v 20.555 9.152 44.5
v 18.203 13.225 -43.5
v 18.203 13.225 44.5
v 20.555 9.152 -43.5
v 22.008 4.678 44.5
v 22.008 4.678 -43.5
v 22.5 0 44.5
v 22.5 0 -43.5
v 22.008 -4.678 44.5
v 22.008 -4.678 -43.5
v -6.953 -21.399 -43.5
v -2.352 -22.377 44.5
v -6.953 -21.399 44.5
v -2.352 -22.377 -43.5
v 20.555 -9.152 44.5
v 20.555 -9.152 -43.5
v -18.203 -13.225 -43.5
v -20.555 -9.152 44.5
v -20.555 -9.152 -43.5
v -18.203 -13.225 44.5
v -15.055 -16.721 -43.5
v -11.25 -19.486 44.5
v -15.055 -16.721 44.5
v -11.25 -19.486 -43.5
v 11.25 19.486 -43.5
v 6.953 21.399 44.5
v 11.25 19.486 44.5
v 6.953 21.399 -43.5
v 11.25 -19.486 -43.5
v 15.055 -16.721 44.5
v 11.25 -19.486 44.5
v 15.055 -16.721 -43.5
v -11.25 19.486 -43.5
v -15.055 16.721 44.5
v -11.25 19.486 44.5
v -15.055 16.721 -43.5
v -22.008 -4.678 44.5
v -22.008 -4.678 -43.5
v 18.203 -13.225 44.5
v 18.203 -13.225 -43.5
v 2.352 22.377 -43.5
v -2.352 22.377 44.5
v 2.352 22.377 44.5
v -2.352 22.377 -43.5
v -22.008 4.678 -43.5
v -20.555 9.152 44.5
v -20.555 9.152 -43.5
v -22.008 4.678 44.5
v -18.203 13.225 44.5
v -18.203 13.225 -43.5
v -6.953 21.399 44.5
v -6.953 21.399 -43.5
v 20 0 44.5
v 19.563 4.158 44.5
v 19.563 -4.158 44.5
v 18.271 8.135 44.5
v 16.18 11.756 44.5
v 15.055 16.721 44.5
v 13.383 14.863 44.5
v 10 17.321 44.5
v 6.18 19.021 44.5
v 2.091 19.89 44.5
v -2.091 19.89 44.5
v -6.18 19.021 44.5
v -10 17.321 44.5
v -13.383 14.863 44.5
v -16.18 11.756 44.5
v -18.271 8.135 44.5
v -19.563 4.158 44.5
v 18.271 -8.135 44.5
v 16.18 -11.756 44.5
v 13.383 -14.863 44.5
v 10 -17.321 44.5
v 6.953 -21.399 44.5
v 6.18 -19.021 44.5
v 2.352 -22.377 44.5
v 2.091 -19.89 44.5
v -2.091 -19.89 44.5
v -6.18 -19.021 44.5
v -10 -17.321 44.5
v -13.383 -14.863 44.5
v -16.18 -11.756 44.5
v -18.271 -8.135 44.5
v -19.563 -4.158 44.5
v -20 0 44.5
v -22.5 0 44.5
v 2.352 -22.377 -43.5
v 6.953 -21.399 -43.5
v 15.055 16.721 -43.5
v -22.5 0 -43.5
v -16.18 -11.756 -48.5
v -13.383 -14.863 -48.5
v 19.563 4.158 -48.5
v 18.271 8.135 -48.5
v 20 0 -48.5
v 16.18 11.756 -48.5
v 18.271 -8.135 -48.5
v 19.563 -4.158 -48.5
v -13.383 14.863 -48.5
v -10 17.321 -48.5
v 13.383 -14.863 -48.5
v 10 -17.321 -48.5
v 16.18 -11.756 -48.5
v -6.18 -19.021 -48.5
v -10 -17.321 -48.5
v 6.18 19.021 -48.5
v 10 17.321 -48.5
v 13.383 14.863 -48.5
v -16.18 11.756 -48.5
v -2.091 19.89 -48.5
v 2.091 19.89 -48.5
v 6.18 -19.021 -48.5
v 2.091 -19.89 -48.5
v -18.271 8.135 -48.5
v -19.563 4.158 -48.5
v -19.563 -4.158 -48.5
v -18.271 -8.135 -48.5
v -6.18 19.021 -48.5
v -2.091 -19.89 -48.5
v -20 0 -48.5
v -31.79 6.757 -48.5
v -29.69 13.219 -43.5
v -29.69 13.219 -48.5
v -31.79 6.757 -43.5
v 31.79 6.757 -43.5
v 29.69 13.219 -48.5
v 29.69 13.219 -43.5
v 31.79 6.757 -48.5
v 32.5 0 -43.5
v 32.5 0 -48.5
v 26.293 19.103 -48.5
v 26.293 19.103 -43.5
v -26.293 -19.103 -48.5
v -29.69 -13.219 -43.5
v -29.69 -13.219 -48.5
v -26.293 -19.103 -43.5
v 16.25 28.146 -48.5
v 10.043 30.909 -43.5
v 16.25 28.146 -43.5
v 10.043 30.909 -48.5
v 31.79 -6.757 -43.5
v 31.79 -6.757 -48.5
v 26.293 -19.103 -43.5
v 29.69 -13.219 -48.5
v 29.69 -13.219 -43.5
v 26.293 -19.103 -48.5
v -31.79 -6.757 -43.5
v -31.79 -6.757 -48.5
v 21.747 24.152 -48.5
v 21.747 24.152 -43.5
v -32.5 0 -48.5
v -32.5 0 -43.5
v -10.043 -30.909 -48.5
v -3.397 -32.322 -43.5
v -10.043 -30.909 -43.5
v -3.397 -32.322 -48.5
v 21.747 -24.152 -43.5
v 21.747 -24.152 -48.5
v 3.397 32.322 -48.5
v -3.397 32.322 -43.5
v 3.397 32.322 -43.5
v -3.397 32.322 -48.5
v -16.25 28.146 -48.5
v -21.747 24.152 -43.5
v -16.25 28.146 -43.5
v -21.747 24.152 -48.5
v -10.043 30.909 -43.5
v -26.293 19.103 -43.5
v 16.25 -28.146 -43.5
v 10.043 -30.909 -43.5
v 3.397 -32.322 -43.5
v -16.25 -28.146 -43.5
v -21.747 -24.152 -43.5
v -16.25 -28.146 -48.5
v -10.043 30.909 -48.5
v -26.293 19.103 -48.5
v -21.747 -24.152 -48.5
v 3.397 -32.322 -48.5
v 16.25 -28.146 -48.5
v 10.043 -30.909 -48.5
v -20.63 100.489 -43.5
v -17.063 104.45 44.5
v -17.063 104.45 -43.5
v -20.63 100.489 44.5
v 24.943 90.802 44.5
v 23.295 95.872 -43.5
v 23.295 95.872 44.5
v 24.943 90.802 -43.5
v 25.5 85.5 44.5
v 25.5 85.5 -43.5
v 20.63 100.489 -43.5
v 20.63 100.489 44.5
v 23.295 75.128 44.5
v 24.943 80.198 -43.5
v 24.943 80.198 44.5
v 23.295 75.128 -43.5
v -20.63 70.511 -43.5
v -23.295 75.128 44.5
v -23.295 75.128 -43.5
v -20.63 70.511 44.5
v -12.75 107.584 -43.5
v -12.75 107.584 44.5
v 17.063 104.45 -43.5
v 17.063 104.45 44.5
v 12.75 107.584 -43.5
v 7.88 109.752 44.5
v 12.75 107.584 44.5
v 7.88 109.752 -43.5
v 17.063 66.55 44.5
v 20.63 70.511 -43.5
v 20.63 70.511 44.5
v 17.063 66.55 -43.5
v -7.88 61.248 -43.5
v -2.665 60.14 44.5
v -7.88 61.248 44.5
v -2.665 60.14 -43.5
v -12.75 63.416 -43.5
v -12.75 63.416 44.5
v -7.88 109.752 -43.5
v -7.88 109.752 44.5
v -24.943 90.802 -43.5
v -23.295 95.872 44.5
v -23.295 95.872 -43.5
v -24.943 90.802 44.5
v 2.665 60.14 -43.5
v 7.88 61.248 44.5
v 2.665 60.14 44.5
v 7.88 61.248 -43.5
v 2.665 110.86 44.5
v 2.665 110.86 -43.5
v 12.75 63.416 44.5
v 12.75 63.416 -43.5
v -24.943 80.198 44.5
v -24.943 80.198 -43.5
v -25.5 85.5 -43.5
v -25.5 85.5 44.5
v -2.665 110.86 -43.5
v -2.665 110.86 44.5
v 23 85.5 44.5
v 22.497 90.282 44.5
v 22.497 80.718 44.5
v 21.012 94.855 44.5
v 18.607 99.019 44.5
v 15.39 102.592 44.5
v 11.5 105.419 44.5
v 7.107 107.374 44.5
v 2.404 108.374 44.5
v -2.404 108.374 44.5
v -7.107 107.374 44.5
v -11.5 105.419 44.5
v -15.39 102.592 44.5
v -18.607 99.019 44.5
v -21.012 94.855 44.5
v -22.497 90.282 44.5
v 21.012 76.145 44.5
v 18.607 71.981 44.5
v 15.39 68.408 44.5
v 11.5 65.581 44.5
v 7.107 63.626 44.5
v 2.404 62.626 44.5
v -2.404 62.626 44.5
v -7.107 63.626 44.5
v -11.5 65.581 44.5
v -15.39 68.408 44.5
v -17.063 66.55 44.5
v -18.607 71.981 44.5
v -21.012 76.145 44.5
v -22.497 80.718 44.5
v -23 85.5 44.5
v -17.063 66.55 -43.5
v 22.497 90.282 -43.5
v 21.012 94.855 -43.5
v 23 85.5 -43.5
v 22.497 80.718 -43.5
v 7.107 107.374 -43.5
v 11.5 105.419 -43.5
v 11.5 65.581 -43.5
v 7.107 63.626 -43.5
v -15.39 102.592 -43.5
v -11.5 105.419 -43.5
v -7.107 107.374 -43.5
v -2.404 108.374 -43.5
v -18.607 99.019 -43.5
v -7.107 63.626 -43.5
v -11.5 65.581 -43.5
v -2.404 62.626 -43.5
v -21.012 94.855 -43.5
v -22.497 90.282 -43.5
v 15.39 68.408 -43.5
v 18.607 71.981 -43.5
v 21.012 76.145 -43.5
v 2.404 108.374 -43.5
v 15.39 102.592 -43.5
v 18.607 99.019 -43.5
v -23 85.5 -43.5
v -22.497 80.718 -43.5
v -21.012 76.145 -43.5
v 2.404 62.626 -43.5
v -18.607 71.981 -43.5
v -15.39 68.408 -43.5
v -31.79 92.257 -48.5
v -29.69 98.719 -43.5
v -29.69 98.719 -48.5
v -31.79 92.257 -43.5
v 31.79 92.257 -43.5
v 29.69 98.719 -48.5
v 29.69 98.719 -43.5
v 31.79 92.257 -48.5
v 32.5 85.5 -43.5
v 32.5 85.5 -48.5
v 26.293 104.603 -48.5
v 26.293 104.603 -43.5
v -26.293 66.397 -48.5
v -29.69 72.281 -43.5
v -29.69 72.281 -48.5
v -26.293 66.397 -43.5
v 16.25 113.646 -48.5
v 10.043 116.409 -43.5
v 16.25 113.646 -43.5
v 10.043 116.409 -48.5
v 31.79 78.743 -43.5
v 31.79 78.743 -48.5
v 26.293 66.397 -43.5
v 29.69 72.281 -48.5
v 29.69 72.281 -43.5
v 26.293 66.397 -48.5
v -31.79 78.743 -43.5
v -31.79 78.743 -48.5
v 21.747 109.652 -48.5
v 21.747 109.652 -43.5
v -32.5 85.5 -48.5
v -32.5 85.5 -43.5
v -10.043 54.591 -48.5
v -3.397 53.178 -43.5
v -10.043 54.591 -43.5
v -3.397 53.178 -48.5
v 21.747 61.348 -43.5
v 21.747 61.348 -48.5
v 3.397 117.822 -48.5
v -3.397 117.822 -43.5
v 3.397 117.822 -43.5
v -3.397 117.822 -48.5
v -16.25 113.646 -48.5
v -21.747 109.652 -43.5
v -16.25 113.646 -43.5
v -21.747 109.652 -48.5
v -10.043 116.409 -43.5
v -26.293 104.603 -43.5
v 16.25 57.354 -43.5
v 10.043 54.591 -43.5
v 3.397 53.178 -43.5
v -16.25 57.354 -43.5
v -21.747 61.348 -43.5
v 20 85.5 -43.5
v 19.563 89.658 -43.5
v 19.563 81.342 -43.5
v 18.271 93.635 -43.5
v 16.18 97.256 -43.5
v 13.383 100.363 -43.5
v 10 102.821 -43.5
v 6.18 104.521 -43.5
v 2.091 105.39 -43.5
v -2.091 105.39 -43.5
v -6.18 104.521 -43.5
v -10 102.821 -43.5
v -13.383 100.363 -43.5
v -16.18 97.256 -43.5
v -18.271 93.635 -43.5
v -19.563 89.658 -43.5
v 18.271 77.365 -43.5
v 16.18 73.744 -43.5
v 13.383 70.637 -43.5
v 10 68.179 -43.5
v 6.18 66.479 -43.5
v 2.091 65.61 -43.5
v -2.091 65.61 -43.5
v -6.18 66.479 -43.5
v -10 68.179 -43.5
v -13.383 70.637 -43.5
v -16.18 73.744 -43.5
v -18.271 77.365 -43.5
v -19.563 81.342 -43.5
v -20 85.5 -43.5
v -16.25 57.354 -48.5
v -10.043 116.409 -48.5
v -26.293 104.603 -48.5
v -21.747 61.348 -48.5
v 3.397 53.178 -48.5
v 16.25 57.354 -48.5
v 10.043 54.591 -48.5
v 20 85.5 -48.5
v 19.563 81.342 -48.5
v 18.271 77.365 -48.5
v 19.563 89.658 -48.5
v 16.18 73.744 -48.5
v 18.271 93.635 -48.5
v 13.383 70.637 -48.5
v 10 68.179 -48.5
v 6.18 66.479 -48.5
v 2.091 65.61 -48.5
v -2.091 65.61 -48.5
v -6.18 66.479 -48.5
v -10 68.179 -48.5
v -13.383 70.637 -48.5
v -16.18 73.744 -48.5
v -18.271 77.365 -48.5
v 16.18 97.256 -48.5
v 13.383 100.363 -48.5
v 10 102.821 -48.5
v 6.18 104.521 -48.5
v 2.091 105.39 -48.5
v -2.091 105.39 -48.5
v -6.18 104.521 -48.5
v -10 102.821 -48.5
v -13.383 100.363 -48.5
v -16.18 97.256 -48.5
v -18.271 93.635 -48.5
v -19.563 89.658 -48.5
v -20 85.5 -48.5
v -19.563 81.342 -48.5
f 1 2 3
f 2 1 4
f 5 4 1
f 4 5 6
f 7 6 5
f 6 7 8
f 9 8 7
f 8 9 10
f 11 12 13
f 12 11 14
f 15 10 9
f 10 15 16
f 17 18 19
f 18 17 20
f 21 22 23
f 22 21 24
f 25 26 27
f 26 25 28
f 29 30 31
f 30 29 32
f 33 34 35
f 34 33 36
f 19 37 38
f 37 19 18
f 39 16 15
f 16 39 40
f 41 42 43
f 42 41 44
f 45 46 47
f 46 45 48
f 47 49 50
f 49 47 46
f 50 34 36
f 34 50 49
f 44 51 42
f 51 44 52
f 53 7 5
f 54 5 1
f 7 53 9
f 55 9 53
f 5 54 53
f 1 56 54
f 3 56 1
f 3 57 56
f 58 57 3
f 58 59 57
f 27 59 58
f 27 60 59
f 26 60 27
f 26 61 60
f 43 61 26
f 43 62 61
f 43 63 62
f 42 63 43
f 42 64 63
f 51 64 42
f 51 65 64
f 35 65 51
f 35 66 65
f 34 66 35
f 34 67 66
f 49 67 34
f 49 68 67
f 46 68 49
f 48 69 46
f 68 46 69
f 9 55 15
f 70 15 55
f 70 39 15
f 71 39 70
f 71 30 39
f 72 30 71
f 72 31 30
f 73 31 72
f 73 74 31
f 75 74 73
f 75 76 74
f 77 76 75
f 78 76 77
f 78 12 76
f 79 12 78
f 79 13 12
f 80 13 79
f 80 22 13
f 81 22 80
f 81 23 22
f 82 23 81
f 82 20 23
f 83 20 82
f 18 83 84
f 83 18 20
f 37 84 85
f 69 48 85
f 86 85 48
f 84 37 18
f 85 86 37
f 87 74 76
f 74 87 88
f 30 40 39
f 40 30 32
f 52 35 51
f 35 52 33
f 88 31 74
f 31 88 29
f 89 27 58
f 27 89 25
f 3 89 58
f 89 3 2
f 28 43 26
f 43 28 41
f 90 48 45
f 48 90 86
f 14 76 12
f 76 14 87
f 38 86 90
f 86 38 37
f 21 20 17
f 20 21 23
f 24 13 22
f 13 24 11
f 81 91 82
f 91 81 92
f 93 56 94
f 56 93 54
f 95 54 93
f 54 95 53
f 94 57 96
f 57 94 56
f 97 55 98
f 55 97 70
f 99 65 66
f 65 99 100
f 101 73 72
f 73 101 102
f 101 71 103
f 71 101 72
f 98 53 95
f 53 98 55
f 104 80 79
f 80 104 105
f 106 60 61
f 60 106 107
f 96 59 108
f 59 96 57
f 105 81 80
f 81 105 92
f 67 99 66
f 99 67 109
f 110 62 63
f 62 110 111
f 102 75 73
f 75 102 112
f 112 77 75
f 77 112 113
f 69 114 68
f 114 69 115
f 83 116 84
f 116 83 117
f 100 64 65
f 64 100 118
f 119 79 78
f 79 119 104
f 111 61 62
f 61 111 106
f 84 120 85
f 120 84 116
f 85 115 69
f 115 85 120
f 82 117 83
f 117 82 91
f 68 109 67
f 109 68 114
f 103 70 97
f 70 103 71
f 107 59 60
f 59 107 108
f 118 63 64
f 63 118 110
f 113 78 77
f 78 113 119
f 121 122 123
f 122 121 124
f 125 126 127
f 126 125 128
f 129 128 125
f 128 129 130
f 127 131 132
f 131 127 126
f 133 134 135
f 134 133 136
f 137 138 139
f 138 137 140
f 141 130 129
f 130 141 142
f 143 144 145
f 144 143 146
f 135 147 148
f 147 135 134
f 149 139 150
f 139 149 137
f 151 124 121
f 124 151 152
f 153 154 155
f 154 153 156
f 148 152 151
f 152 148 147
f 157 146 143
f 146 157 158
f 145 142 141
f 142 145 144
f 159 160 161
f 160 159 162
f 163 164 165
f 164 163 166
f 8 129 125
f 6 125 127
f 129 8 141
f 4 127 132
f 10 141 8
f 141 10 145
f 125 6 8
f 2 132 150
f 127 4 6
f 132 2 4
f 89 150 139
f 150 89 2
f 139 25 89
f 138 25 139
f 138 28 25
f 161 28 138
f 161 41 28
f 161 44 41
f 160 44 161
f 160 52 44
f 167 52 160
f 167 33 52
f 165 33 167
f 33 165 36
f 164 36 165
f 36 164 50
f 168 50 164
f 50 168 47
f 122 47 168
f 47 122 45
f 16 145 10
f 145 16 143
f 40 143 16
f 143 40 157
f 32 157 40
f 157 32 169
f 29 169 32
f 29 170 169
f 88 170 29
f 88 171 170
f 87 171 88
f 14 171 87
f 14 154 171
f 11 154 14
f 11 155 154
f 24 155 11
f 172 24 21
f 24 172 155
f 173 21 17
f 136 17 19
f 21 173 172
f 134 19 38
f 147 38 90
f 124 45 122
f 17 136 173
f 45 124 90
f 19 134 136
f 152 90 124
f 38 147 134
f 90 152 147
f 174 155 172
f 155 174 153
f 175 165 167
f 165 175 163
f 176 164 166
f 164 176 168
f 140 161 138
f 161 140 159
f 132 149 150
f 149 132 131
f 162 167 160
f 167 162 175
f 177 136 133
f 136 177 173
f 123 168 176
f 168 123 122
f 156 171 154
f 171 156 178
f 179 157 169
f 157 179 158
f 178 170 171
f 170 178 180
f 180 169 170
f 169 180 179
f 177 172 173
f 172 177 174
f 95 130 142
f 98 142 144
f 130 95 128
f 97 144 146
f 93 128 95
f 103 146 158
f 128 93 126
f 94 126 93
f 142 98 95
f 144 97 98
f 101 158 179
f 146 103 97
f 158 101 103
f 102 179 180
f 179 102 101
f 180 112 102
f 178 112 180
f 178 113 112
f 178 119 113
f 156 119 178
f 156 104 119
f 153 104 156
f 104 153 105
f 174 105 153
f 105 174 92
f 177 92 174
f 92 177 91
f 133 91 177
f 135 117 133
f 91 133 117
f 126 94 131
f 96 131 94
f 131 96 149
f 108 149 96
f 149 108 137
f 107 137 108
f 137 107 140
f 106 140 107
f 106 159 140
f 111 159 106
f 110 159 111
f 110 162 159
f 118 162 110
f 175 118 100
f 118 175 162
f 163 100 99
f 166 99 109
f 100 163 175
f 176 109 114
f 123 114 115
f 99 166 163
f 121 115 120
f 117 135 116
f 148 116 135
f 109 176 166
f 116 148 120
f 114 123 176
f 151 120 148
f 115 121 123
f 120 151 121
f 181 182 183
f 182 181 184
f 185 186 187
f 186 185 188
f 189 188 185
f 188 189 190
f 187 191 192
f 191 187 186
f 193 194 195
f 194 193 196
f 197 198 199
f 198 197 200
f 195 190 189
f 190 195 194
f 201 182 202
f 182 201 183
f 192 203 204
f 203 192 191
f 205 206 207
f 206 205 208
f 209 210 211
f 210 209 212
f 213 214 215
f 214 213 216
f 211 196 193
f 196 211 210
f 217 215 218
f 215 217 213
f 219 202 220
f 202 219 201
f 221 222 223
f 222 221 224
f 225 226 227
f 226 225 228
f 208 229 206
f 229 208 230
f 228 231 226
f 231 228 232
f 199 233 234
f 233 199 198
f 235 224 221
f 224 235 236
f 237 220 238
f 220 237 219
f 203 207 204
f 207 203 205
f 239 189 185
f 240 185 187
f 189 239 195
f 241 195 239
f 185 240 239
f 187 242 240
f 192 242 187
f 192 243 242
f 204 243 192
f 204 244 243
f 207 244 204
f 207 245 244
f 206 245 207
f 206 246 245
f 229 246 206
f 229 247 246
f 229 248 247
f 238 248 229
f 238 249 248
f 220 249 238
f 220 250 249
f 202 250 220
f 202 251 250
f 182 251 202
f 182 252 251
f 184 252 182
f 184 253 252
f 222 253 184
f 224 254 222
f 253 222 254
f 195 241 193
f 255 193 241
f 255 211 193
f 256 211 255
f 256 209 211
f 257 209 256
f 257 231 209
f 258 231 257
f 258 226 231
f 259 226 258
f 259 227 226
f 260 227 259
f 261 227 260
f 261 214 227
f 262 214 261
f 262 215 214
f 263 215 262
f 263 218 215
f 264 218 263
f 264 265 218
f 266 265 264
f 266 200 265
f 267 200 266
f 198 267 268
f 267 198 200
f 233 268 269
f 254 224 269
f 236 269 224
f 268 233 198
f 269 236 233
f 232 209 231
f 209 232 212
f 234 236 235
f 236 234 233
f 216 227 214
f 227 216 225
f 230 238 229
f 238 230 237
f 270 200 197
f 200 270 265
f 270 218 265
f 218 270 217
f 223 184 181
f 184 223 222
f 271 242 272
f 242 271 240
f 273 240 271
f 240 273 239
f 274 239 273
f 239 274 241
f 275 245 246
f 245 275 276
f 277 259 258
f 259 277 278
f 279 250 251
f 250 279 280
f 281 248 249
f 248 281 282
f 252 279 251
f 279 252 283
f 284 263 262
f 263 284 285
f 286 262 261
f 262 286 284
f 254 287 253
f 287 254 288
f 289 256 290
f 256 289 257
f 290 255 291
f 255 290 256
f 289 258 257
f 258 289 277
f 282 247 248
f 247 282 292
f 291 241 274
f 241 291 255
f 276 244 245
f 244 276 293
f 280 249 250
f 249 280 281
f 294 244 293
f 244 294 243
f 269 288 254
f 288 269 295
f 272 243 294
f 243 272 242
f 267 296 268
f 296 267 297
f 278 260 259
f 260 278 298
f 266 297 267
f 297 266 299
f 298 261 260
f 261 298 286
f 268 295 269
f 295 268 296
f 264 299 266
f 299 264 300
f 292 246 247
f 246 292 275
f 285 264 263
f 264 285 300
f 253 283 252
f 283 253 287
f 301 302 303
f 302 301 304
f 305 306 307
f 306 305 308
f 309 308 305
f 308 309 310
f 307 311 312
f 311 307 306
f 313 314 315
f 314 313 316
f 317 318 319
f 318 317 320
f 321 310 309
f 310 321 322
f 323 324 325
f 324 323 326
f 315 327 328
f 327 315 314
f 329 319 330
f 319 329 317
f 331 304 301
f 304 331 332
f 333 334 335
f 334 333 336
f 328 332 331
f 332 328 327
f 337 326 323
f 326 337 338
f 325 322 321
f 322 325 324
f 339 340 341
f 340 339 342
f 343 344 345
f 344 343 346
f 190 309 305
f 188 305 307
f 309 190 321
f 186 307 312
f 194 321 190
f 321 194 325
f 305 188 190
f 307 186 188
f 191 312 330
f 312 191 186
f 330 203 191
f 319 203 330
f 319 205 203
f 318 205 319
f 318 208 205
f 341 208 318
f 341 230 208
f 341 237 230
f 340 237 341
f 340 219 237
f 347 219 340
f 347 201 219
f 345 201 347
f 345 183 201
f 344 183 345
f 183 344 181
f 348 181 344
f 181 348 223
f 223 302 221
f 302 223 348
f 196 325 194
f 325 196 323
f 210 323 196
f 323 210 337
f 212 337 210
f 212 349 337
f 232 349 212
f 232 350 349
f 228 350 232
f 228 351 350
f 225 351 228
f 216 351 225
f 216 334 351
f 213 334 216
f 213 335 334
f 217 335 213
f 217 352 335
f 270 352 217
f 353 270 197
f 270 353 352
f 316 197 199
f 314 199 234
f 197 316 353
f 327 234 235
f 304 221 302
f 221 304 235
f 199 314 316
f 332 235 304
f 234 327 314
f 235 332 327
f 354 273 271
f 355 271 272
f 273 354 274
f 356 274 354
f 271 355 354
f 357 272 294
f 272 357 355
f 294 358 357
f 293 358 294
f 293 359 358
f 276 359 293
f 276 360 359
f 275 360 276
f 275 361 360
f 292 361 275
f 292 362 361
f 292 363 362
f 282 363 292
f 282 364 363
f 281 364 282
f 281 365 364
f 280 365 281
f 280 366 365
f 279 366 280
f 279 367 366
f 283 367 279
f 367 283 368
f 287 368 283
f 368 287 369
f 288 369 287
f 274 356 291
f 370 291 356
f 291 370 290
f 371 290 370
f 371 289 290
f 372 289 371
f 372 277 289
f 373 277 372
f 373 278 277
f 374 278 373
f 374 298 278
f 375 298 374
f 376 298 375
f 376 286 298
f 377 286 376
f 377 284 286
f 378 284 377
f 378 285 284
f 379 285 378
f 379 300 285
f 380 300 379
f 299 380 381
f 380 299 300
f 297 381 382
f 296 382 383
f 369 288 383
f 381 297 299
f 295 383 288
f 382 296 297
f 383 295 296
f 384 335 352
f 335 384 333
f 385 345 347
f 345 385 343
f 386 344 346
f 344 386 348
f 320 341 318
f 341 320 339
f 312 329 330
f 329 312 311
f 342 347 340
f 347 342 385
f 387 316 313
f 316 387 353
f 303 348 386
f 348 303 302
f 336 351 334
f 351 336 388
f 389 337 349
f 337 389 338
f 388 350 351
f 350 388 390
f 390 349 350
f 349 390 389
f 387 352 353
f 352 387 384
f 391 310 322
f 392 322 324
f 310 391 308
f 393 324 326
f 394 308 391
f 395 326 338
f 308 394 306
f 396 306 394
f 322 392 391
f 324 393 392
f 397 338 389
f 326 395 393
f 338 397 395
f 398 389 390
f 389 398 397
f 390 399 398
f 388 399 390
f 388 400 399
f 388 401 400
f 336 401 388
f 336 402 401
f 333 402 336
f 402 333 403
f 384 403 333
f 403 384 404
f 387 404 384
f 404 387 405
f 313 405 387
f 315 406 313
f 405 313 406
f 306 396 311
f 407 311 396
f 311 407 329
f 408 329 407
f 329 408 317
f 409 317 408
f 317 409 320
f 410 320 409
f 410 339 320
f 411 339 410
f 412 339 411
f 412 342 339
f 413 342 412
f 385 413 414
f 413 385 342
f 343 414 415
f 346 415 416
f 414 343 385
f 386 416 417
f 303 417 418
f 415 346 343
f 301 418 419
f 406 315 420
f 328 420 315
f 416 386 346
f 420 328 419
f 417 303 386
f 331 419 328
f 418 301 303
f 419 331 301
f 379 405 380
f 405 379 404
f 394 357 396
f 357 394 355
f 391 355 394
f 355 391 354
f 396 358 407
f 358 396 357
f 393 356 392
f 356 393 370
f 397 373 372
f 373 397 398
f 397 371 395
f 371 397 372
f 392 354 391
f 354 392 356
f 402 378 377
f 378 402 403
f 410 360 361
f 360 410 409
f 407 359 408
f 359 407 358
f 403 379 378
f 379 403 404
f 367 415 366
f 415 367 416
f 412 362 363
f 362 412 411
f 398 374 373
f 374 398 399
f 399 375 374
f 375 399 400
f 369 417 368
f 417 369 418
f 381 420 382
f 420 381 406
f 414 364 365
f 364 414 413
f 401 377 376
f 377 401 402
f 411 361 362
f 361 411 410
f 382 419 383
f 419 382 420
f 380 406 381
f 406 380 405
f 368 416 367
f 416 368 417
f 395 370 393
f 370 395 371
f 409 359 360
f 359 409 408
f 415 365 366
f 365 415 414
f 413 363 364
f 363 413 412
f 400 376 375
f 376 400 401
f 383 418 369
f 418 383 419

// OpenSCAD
passthrough_height = 89;
passthrough_radius_outer = 25.5;
wall_thickness = 2.5;
flare_radius = 12.5;
flare_thickness = 3;
fit_gap = 1;

passthrough_radius_inner = passthrough_radius_outer - wall_thickness - fit_gap/2;


//
// inner grommet
translate([0,0,0]) {
    difference() {
        // 
        // main tube
        cylinder(
            h = passthrough_height,
            r1 = passthrough_radius_inner,
            r2 = passthrough_radius_inner,
            center = true);
        //
        // void
        cylinder(
            h = passthrough_height + 1,
            r1 = passthrough_radius_inner - wall_thickness,
            r2 = passthrough_radius_inner - wall_thickness,
            center = true);
    }
}

// inner grommet base flare
translate([0,0,-(passthrough_height + flare_thickness)/2]) {
    difference() {
        //
        // main flare
        cylinder(
            h = 5,
            r1 = passthrough_radius_inner - wall_thickness + flare_radius,
            r2 = passthrough_radius_inner - wall_thickness + flare_radius,
            center = true);
        //
        // void
        cylinder(
            h = passthrough_height + 1,
            r1 = passthrough_radius_inner - wall_thickness,
            r2 = passthrough_radius_inner - wall_thickness,
            center = true);
    }  
}

// outer grommet
translate([0,(passthrough_radius_outer + flare_radius)*2.25,0]) {
    difference() {
        // 
        // main tube
        cylinder(
            h = passthrough_height,
            r1 = passthrough_radius_outer,
            r2 = passthrough_radius_outer,
            center = true);
        //
        // void
        cylinder(
            h = passthrough_height + 1,
            r1 = passthrough_radius_outer - wall_thickness,
            r2 = passthrough_radius_outer - wall_thickness,
            center = true);
    }
}

// outer grommet base flare
translate([0,(passthrough_radius_outer + flare_radius)*2.25,-(passthrough_height + flare_thickness)/2]) {
    difference() {
        //
        // main flare
        cylinder(
            h = 5,
            r1 = passthrough_radius_inner - wall_thickness + flare_radius,
            r2 = passthrough_radius_inner - wall_thickness + flare_radius,
            center = true);
        //
        // void
        cylinder(
            h = passthrough_height + 1,
            r1 = passthrough_radius_inner - wall_thickness,
            r2 = passthrough_radius_inner - wall_thickness,
            center = true);
    }  
}
